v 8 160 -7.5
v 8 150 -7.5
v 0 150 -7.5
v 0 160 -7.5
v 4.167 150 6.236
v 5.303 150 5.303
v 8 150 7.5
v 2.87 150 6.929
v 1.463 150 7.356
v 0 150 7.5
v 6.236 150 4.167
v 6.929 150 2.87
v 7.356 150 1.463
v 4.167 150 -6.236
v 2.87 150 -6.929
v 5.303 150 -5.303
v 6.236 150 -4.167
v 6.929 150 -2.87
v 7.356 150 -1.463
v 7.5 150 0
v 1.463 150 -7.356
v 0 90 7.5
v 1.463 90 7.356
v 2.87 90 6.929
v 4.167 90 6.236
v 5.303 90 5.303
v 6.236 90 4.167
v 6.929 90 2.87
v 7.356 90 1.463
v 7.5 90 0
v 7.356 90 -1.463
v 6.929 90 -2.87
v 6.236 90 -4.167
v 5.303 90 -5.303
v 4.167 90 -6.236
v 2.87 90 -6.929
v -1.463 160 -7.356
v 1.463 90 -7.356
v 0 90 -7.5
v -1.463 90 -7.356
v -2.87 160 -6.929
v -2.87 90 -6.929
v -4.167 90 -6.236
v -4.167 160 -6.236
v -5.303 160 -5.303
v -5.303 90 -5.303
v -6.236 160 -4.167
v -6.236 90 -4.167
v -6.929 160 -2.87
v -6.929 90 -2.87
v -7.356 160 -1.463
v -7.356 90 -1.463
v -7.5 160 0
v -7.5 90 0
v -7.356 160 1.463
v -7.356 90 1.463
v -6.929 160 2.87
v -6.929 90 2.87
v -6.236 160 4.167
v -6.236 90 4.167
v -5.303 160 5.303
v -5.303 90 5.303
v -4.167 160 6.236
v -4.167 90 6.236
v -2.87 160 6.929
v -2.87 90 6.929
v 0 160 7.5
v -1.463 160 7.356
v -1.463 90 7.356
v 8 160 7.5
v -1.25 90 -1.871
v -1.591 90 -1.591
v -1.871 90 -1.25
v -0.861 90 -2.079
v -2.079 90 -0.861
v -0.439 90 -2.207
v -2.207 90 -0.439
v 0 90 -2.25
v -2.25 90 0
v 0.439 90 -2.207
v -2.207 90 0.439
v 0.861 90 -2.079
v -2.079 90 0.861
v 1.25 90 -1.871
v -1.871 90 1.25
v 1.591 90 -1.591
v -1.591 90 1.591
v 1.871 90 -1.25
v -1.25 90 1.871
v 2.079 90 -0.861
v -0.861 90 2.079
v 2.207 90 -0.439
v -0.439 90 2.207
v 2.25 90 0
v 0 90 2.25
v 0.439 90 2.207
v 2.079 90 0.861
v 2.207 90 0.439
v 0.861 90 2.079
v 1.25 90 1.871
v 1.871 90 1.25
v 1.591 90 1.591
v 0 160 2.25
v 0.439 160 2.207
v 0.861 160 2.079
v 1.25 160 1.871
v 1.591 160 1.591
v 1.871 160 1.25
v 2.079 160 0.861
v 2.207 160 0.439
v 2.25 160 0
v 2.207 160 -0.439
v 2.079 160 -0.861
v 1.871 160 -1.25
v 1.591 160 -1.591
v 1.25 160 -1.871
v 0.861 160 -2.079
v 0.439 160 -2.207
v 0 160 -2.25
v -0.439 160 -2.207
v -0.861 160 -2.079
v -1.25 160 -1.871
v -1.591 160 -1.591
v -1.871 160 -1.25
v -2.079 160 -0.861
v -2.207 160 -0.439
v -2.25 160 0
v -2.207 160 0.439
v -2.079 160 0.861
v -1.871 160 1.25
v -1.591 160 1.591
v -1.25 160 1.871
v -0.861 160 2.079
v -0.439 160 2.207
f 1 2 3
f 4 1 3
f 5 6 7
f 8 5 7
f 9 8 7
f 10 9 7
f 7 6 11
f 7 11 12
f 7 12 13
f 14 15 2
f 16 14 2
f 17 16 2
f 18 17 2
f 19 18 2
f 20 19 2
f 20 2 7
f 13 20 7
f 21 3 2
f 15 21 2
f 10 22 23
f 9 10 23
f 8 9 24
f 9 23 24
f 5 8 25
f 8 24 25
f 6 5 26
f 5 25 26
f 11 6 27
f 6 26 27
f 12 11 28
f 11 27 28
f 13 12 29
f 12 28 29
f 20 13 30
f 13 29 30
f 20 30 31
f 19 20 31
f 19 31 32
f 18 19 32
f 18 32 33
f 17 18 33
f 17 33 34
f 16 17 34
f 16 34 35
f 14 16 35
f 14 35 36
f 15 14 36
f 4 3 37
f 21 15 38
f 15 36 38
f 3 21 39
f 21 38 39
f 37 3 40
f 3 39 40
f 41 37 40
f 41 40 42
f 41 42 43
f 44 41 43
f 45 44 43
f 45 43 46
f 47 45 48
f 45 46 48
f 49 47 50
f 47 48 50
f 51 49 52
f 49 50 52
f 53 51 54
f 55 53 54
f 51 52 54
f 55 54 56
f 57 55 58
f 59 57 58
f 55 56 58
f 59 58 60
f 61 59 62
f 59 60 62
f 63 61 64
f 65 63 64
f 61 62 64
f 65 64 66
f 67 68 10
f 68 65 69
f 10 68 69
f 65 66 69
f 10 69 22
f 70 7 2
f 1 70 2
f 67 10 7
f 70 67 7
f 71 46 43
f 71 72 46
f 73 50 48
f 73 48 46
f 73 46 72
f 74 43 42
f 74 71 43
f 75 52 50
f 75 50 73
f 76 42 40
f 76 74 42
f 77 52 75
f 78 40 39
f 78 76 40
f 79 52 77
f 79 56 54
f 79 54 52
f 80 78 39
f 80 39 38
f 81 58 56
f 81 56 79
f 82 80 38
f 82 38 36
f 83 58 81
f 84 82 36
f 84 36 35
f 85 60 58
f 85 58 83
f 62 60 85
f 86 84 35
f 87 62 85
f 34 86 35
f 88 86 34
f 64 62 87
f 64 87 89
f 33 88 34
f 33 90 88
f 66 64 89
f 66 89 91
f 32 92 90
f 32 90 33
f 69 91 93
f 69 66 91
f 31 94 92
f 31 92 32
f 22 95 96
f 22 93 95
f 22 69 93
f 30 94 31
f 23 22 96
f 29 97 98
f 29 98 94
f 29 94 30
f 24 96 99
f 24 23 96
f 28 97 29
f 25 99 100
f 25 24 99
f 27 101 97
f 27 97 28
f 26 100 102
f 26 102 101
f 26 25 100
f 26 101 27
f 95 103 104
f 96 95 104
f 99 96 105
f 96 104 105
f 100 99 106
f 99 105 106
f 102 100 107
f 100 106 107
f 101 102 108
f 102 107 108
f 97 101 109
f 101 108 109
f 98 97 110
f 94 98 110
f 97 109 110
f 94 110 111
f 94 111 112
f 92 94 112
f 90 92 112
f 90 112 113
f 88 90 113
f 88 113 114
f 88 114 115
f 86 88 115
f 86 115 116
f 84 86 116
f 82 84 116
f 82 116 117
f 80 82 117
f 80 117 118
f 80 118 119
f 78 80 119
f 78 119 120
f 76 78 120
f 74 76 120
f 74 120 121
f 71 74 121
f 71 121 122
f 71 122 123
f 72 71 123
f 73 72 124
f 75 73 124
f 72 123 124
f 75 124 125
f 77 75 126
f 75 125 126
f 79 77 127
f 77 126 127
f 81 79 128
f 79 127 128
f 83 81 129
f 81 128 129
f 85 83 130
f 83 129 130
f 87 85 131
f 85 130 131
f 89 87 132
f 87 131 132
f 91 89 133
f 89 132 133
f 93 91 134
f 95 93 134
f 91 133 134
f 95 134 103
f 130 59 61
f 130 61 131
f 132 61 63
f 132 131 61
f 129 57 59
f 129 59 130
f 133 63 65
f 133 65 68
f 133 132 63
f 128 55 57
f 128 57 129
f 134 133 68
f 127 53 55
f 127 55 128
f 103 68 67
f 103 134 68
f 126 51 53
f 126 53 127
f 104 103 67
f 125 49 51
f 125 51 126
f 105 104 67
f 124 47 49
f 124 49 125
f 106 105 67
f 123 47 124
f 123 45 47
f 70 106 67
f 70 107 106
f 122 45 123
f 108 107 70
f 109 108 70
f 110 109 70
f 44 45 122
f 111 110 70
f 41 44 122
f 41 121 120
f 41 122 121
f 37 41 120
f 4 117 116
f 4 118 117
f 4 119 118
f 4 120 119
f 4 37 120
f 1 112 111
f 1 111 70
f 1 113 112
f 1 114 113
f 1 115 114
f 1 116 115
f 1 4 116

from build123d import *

# Parameters (mm, degrees)
SKETCH1_R          = 7.5
EXTRUSION1_DEPTH   = 160
SKETCH2_R          = 2.25
EXTRUSION2_DEPTH   = 80
EXTRUSION3_START   = -10
EXTRUSION3_DEPTH   = 10
SKETCH4_R          = 9.988310786
EXTRUSION4_DEPTH   = 45
SKETCH5_R          = 7.5
SKETCH5_R_2        = 4
EXTRUSION5_DEPTH   = 15
SKETCH6_R          = 13.00139778
CUT_EXTRUDE1_DEPTH = 45


with BuildPart() as part:
    # Sketch1 → Extrusion1 (new body)
    with BuildSketch(Plane(origin=(0, 0, 0), x_dir=(-1, 0, 0), z_dir=(0, 1, 0))):
        with Locations(Location((0, 0, 0), (0, 0, 90))):
            Circle(SKETCH1_R)
    extrude(amount=EXTRUSION1_DEPTH)

    # Sketch2 → Extrusion2 (cut)
    with BuildSketch(Plane(origin=(0, 160, 0), x_dir=(-1, 0, 0), z_dir=(0, 1, 0))):
        with Locations(Location((0, 0, 0), (0, 0, 90))):
            Circle(SKETCH2_R)
    extrude(amount=-EXTRUSION2_DEPTH, mode=Mode.SUBTRACT)

    # Sketch3 → Extrusion3 (add)
    with BuildSketch(Plane(origin=(0, 160, 0), x_dir=(1, 0, 0), z_dir=(0, 1, 0)).offset(EXTRUSION3_START)):
        with BuildLine():
            Line((0, -7.5), (8, -7.5))
            Line((8, -7.5), (8, 7.5))
            Line((8, 7.5), (0, 7.5))
            ThreePointArc((0, 7.5), (7.5, 0), (0, -7.5))
        make_face()
    extrude(amount=EXTRUSION3_DEPTH)

    # Sketch4 → Extrusion4 (cut)
    with BuildSketch(Plane.XZ):
        Circle(SKETCH4_R)
    extrude(amount=-EXTRUSION4_DEPTH, mode=Mode.SUBTRACT)

    # Sketch5 → Extrusion5 (cut)
    with BuildSketch(Plane.XZ.offset(-45)):
        with Locations(Location((0, 0, 0), (0, 0, 270))):
            Circle(SKETCH5_R)
        with Locations(Location((0, 0, 0), (0, 0, 270))):
            Circle(SKETCH5_R_2, mode=Mode.SUBTRACT)
    extrude(amount=-EXTRUSION5_DEPTH, mode=Mode.SUBTRACT)

    # Sketch6 → Cut-Extrude1 (cut)
    with BuildSketch(Plane.XZ.offset(-45)):
        Circle(SKETCH6_R)
    extrude(amount=-CUT_EXTRUDE1_DEPTH, mode=Mode.SUBTRACT)


solid = part.part
